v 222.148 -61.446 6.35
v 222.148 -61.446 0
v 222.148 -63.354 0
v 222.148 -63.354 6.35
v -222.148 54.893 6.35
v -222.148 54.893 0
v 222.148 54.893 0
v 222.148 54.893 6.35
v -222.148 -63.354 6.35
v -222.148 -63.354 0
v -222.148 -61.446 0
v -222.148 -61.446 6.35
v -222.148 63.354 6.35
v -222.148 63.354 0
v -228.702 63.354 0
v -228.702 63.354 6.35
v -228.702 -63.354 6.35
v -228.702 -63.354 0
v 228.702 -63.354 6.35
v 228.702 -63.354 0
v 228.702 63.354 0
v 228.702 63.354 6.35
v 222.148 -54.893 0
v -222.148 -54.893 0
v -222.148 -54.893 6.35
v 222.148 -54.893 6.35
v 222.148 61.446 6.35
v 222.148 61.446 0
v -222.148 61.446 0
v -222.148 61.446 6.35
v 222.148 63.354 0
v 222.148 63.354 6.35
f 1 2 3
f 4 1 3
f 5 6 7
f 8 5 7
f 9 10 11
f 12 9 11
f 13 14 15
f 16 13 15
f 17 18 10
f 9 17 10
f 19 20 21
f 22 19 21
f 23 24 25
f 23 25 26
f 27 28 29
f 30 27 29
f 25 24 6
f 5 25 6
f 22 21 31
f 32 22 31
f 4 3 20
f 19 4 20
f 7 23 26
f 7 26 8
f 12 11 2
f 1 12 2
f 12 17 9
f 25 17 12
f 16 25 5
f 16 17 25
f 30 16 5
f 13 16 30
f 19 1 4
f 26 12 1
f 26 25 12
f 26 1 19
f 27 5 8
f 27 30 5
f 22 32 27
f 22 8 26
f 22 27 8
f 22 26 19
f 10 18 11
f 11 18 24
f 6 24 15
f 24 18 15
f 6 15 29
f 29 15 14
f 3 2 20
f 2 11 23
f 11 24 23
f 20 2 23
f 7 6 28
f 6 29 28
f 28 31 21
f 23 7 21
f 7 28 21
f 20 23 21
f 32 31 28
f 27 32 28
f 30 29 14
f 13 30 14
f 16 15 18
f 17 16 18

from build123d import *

# Parameters (mm, degrees)
SKETCH1_W           = 444.2968
SKETCH1_H           = 109.78515
BOSS_EXTRUDE1_DEPTH = 6.35


with BuildPart() as part:
    # Sketch1 → Boss-Extrude1 (new body)
    with BuildSketch(Plane.XY):
        Polygon((222.1484, -63.35395), (228.7016, -63.35395), (228.7016, 63.35395), (222.1484, 63.35395), (222.1484, 61.445775), (-222.1484, 61.445775), (-222.1484, 63.35395), (-228.7016, 63.35395), (-228.7016, -63.35395), (-222.1484, -63.35395), (-222.1484, -61.445775), (222.1484, -61.445775), align=None)
        Rectangle(SKETCH1_W, SKETCH1_H, mode=Mode.SUBTRACT)
    extrude(amount=BOSS_EXTRUDE1_DEPTH)


solid = part.part
